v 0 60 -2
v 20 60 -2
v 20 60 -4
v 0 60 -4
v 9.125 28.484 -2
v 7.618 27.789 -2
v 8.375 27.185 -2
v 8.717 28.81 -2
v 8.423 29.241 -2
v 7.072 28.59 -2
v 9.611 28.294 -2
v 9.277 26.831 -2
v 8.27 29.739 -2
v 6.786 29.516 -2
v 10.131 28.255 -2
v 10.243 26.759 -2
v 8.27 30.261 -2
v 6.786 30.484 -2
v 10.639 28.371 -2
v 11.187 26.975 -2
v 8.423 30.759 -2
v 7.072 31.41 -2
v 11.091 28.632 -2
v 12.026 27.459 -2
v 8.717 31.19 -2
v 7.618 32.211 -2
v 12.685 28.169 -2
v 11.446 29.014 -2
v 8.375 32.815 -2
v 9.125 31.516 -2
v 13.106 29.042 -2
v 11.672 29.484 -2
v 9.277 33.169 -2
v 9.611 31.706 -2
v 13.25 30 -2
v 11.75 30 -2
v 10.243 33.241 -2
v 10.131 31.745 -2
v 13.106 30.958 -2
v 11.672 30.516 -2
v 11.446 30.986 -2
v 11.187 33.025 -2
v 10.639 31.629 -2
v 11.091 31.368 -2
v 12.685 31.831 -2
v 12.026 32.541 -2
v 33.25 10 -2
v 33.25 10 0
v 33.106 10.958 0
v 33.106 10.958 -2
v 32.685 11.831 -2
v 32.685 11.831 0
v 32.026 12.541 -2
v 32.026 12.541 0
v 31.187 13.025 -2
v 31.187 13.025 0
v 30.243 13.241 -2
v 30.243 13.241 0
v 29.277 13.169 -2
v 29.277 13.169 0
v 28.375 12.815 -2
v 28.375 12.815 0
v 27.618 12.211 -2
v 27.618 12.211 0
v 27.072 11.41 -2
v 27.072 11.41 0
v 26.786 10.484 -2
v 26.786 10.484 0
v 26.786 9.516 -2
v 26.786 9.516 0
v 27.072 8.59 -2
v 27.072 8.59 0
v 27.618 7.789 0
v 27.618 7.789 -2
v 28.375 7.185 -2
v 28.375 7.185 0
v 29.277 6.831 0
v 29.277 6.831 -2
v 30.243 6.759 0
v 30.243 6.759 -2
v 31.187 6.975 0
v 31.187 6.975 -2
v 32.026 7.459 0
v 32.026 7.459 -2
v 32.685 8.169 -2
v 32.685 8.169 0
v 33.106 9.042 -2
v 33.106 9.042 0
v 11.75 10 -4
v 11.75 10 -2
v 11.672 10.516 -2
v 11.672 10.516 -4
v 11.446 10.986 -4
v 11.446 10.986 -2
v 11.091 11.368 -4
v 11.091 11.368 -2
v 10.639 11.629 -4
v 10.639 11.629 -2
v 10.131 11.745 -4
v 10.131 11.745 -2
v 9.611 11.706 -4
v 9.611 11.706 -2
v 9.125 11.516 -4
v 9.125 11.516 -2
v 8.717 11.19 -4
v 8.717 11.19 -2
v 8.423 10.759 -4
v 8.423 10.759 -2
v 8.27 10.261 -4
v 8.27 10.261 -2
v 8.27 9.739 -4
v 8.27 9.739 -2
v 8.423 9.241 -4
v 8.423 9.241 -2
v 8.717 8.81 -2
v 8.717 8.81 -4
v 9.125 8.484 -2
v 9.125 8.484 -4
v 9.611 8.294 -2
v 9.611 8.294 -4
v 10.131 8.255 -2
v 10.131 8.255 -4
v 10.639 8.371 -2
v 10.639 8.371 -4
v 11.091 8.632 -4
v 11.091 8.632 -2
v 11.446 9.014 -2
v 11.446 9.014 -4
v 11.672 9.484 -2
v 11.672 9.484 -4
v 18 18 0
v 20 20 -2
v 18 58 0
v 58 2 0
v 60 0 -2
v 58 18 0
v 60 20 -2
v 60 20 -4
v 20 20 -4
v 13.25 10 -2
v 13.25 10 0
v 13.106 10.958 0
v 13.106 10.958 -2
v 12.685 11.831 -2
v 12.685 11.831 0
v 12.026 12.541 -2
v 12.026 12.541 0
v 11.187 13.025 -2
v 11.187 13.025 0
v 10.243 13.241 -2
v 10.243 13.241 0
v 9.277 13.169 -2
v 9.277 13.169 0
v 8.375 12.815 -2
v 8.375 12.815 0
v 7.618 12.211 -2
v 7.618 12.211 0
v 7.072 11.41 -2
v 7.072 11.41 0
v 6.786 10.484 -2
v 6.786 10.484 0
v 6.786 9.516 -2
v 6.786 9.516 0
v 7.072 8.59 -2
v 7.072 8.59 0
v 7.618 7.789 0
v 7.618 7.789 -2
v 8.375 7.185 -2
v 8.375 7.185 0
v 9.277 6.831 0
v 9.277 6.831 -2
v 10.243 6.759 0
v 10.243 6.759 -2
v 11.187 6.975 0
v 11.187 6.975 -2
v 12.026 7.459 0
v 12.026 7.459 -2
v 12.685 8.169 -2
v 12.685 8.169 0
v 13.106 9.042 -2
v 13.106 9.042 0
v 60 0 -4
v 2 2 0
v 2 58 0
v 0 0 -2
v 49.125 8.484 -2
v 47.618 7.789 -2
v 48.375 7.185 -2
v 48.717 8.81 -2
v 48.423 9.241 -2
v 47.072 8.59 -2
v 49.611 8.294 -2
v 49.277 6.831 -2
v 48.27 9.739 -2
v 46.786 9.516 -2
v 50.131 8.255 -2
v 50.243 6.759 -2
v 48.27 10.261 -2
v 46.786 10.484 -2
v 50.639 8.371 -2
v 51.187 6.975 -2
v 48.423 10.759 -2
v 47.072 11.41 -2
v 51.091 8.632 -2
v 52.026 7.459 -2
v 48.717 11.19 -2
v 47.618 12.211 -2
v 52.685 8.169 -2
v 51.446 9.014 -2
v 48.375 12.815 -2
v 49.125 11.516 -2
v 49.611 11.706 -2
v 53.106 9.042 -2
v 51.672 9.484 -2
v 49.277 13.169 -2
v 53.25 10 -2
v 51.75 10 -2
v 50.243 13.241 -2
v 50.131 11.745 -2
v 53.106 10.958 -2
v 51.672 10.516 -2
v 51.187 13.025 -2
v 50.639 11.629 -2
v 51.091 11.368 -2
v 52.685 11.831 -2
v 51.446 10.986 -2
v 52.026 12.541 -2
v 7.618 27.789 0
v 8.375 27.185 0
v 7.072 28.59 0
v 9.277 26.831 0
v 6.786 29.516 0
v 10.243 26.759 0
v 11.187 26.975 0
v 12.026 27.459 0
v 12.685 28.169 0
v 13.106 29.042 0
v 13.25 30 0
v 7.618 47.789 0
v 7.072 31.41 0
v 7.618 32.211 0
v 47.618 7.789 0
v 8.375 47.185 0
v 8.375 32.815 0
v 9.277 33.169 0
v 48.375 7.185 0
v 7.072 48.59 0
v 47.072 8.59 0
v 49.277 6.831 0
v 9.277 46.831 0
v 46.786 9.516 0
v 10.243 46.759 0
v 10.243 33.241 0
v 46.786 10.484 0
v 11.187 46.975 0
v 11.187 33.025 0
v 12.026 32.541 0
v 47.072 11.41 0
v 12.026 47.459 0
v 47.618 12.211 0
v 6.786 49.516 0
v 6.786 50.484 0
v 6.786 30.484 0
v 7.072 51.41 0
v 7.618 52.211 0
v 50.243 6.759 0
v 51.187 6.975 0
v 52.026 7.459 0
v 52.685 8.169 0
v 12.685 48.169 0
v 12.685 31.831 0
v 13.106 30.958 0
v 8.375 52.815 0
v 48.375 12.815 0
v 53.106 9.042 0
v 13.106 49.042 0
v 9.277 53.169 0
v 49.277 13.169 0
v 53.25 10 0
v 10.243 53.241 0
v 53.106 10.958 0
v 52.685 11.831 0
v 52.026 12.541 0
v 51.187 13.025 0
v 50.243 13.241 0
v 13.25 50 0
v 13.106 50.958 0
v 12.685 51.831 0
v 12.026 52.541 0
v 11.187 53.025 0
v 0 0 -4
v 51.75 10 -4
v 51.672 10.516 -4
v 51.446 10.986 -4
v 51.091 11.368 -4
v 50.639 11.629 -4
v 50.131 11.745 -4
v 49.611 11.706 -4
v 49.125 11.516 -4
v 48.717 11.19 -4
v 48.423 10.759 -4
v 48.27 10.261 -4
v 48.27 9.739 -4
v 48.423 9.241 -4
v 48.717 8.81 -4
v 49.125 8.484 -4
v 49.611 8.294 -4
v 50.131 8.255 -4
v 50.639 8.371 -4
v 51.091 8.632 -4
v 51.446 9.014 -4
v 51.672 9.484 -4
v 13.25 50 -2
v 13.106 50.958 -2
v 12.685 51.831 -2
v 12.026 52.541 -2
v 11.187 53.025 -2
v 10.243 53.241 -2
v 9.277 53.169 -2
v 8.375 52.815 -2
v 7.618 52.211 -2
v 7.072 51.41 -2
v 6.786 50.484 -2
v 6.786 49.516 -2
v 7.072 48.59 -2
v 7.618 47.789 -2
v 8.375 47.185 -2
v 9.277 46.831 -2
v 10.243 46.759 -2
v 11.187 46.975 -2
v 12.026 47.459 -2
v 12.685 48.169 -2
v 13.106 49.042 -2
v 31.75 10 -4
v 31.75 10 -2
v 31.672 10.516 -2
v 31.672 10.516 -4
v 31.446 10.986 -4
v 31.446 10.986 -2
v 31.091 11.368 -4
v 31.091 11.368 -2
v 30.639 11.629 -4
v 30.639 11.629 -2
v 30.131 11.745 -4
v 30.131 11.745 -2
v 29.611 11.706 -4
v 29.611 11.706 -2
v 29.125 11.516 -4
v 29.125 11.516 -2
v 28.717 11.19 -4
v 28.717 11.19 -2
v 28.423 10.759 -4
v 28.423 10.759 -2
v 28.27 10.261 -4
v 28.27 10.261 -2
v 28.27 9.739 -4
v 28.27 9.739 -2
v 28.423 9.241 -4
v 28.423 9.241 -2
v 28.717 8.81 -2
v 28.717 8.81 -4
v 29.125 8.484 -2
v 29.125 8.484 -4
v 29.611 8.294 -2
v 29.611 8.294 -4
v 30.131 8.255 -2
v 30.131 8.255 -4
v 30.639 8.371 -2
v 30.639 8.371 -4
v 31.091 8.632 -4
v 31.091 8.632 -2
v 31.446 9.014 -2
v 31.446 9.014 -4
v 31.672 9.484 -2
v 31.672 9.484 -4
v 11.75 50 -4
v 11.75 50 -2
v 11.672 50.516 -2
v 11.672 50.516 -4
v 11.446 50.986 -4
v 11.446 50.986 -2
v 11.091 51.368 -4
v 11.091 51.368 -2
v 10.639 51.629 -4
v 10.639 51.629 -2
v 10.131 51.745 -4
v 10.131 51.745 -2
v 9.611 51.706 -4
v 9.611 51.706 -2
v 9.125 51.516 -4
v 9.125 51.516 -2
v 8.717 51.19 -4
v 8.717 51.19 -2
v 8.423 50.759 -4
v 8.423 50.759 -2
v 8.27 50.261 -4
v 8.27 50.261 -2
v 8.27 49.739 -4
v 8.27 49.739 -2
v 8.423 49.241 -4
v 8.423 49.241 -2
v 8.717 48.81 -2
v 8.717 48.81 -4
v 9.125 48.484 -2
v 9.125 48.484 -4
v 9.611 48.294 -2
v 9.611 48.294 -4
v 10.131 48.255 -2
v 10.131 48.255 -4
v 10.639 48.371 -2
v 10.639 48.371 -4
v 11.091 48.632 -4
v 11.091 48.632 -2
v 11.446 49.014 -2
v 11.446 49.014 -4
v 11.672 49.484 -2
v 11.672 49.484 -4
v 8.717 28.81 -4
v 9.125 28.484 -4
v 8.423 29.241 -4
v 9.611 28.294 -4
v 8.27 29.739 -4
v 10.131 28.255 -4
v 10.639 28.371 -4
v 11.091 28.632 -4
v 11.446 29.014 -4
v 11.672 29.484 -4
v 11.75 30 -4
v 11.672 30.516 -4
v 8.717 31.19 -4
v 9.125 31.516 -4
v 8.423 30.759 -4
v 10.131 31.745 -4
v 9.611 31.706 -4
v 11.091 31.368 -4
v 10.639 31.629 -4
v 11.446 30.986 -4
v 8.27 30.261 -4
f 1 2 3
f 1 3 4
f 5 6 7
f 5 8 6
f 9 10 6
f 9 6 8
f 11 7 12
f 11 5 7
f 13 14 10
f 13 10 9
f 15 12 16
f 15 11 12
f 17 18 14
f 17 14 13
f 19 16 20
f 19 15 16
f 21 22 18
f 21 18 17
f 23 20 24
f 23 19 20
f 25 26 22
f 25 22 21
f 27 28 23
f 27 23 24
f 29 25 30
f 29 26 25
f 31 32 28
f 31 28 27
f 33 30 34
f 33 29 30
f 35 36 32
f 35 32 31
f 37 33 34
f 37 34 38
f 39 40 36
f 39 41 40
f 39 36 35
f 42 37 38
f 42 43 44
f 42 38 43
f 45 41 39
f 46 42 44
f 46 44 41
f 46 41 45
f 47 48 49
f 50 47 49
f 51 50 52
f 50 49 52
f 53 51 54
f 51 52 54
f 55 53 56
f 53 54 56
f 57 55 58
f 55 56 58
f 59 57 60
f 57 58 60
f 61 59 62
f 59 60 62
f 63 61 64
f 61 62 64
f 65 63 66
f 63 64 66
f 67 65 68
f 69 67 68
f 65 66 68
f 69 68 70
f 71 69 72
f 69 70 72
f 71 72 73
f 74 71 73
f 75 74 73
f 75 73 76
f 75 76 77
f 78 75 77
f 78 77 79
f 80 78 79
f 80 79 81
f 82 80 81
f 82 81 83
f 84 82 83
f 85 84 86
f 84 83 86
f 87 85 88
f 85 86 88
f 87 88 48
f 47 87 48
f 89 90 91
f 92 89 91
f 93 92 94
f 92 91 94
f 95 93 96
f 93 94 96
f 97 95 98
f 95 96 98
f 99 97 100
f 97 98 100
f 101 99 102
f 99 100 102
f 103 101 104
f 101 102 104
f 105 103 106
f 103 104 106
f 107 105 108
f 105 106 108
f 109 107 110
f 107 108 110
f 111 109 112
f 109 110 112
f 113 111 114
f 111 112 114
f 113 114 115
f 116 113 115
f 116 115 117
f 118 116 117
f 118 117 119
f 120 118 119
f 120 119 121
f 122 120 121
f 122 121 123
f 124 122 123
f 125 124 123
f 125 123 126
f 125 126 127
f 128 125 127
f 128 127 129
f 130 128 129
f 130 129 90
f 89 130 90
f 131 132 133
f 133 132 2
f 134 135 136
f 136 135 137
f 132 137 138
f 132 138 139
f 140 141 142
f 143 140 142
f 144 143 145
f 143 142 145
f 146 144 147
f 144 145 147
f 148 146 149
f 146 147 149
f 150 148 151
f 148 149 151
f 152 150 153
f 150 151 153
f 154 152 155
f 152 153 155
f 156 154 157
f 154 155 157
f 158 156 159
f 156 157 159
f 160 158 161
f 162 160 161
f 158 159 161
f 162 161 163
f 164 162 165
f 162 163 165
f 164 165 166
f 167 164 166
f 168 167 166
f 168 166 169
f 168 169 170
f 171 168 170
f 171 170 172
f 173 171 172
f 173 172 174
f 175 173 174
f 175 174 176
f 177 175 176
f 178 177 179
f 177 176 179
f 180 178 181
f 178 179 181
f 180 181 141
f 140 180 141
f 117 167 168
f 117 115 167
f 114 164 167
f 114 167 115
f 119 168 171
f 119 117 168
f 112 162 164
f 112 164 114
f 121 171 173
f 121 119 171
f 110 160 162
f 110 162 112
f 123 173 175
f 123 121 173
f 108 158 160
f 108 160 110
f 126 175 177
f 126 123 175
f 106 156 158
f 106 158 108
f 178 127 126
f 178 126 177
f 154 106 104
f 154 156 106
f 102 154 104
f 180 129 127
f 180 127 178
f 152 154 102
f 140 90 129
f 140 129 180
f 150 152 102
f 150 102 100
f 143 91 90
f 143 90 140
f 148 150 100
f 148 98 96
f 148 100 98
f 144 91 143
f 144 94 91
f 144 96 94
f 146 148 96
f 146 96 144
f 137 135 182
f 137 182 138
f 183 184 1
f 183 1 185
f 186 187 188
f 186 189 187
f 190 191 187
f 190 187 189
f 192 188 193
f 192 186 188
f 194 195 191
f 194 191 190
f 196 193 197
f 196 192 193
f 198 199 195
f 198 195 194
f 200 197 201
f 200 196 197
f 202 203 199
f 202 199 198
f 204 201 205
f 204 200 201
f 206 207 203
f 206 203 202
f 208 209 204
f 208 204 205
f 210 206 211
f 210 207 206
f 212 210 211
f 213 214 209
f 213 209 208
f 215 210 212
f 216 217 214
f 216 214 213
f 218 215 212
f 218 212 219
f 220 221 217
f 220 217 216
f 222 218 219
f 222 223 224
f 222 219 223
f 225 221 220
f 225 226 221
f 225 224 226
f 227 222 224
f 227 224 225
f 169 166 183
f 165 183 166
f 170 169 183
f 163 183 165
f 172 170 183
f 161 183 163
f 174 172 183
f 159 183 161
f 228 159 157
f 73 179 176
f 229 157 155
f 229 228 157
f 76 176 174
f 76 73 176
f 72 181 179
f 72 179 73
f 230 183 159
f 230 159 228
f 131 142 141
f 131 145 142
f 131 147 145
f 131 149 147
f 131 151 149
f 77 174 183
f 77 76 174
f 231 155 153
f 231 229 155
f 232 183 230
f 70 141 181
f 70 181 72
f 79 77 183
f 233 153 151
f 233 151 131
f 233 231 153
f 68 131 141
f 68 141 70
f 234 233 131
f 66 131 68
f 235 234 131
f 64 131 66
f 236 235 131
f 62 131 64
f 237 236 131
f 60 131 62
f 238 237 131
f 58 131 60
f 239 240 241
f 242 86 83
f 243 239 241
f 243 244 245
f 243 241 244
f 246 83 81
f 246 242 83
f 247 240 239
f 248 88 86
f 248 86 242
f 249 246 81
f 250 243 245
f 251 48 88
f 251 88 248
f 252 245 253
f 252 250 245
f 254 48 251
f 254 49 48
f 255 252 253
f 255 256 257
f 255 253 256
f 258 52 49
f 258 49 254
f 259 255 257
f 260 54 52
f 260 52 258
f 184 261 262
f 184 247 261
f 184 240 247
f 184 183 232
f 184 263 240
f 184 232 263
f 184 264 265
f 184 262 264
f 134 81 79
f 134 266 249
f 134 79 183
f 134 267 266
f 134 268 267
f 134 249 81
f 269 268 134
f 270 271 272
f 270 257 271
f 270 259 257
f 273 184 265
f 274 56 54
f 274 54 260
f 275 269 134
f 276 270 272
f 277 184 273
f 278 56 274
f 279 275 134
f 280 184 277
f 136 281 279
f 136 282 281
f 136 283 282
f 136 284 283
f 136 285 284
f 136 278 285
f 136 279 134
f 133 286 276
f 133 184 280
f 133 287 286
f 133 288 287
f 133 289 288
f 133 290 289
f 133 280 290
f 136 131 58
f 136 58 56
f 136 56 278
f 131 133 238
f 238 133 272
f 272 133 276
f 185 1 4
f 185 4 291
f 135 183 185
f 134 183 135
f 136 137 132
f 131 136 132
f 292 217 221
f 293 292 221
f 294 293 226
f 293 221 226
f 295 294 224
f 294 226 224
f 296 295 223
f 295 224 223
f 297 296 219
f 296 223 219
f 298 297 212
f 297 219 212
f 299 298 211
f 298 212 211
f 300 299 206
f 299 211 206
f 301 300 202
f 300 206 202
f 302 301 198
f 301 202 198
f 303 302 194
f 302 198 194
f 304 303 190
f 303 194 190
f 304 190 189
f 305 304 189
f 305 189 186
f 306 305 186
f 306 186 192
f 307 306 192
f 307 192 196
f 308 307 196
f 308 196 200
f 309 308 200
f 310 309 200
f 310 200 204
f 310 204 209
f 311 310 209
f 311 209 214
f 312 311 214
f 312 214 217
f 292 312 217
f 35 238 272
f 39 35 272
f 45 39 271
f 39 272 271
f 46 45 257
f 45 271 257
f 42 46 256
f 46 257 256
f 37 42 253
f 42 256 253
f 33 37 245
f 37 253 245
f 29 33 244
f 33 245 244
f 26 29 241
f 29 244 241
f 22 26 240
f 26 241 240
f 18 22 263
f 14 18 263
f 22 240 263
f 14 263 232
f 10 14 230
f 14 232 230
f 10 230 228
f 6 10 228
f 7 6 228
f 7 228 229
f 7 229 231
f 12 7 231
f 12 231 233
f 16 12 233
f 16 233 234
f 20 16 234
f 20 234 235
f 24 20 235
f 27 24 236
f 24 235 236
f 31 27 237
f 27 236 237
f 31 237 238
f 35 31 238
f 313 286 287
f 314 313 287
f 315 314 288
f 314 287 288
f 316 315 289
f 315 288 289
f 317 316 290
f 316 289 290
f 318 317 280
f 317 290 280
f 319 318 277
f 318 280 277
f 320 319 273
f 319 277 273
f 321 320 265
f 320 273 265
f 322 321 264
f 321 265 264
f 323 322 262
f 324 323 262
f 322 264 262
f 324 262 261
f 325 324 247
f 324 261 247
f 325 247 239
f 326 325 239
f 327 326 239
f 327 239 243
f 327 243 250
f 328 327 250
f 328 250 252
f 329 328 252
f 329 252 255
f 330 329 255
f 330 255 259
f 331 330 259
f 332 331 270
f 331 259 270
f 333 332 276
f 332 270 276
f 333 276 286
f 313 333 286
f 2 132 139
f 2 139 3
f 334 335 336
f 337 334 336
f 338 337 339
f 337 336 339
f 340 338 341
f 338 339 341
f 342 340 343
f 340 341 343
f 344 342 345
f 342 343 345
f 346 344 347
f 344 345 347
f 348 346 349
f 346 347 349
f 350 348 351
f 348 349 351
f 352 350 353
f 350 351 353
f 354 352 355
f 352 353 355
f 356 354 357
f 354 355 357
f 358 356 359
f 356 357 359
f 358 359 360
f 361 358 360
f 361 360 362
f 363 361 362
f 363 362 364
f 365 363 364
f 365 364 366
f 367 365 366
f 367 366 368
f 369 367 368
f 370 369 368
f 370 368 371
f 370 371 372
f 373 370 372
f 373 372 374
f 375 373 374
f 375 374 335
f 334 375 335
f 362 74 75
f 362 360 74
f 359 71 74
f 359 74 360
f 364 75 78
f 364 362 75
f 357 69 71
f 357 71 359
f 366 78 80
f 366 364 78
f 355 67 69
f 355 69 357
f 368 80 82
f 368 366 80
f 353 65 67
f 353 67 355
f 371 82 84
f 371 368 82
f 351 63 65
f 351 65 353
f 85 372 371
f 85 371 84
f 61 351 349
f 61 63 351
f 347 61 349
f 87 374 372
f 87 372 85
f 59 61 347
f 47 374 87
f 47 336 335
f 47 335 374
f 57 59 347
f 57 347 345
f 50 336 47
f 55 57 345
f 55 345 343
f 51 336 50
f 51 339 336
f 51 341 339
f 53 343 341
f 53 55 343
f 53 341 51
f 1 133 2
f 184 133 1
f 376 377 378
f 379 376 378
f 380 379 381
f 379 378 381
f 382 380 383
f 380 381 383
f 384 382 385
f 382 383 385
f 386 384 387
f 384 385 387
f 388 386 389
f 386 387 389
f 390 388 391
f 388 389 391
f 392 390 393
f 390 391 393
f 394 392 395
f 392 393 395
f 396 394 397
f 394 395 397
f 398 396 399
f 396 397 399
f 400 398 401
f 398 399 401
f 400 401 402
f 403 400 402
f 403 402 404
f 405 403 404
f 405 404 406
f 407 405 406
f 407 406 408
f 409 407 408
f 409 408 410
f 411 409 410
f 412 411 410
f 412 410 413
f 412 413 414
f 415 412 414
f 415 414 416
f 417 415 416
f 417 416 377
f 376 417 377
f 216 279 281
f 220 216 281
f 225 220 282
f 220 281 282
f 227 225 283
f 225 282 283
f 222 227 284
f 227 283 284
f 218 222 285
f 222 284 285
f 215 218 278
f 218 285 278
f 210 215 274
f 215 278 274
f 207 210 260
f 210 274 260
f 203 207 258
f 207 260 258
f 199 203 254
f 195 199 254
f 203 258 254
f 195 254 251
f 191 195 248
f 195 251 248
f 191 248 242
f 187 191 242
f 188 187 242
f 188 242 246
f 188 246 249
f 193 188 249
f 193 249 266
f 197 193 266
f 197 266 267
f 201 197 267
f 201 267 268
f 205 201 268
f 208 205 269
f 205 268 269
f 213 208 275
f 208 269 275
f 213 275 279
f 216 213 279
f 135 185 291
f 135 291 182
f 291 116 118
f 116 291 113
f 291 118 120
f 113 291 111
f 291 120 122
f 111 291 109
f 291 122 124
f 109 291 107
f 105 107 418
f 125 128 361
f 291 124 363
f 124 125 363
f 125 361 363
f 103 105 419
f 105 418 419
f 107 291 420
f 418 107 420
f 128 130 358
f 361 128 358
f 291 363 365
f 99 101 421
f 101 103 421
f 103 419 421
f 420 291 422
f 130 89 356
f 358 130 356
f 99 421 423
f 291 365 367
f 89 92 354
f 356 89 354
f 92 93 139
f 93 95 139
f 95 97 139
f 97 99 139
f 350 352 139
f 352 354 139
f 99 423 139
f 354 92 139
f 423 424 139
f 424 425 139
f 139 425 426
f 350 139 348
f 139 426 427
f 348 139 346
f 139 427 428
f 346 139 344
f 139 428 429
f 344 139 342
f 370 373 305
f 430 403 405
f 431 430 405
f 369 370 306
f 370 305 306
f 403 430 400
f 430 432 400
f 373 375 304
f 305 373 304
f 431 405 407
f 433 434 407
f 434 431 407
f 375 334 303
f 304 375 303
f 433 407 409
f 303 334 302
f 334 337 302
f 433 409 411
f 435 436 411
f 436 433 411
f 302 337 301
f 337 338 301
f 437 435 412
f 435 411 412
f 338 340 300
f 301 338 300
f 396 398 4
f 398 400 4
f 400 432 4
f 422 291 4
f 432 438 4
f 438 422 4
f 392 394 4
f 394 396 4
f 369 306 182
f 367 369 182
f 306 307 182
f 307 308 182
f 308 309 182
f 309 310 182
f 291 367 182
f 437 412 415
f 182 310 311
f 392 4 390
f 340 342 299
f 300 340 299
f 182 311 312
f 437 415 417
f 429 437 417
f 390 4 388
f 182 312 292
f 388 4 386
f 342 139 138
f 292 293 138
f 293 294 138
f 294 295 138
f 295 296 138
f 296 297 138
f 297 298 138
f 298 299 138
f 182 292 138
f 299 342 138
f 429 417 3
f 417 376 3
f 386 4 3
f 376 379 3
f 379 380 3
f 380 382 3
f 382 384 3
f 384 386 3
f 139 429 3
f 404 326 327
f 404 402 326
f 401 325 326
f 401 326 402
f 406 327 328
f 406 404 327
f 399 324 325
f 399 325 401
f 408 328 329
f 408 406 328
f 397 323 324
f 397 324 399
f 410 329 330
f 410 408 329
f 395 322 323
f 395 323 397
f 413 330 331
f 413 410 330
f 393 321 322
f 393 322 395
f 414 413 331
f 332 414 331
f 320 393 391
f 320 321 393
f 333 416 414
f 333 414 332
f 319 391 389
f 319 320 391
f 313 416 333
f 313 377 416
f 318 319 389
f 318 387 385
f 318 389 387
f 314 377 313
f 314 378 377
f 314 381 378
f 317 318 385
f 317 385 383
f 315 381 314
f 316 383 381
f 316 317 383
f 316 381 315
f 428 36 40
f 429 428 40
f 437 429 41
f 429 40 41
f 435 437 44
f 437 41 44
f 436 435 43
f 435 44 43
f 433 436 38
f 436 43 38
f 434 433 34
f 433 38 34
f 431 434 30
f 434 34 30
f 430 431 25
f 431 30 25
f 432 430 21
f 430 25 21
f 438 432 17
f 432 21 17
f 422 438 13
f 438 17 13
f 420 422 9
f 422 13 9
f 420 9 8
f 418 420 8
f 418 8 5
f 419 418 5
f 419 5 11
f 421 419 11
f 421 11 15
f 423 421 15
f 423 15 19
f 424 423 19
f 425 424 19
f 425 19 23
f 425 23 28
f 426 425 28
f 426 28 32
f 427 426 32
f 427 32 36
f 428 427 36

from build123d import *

# Parameters (mm, degrees)
F2_R     = 3.25
F2_R_2   = 1.75
F3_DEPTH = 4
F4_DEPTH = 4.001
F5_DEPTH = 2
F6_SIZE  = 2


with BuildPart() as f3:
    # F2 (on Top) → F3 (new body)
    with BuildSketch(Plane.XY):
        Polygon((0, 60), (0, 0), (60, 0), (60, 20), (20, 20), (20, 60), align=None)
        with Locations((10, 10)):
            Circle(F2_R, mode=Mode.SUBTRACT)
        with Locations((30, 10)):
            Circle(F2_R, mode=Mode.SUBTRACT)
        with Locations((50, 10)):
            Circle(F2_R, mode=Mode.SUBTRACT)
        with Locations((10, 30)):
            Circle(F2_R, mode=Mode.SUBTRACT)
        with Locations((10, 50)):
            Circle(F2_R, mode=Mode.SUBTRACT)
        with Locations((10, 50)):
            Circle(F2_R)
        with Locations((10, 50)):
            Circle(F2_R_2, mode=Mode.SUBTRACT)
        with Locations((10, 30)):
            Circle(F2_R)
        with Locations((10, 30)):
            Circle(F2_R_2, mode=Mode.SUBTRACT)
        with Locations((10, 10)):
            Circle(F2_R)
        with Locations((10, 10)):
            Circle(F2_R_2, mode=Mode.SUBTRACT)
        with Locations((30, 10)):
            Circle(F2_R)
        with Locations((30, 10)):
            Circle(F2_R_2, mode=Mode.SUBTRACT)
        with Locations((50, 10)):
            Circle(F2_R)
        with Locations((50, 10)):
            Circle(F2_R_2, mode=Mode.SUBTRACT)
        with Locations((10, 50)):
            Circle(F2_R_2)
        with Locations((10, 30)):
            Circle(F2_R_2)
        with Locations((10, 10)):
            Circle(F2_R_2)
        with Locations((30, 10)):
            Circle(F2_R_2)
        with Locations((50, 10)):
            Circle(F2_R_2)
    extrude(amount=-F3_DEPTH)

    # F2 (on Top) → F4 (cut, through all)
    with BuildSketch(Plane.XY):
        with Locations((10, 50)):
            Circle(F2_R_2)
        with Locations((10, 30)):
            Circle(F2_R_2)
        with Locations((10, 10)):
            Circle(F2_R_2)
        with Locations((30, 10)):
            Circle(F2_R_2)
        with Locations((50, 10)):
            Circle(F2_R_2)
    extrude(amount=-F4_DEPTH, mode=Mode.SUBTRACT)

    # F2 (on Top) → F5 (cut)
    with BuildSketch(Plane.XY):
        with Locations((10, 50)):
            Circle(F2_R)
        with Locations((10, 50)):
            Circle(F2_R_2, mode=Mode.SUBTRACT)
        with Locations((10, 30)):
            Circle(F2_R)
        with Locations((10, 30)):
            Circle(F2_R_2, mode=Mode.SUBTRACT)
        with Locations((10, 10)):
            Circle(F2_R)
        with Locations((10, 10)):
            Circle(F2_R_2, mode=Mode.SUBTRACT)
        with Locations((30, 10)):
            Circle(F2_R)
        with Locations((30, 10)):
            Circle(F2_R_2, mode=Mode.SUBTRACT)
        with Locations((50, 10)):
            Circle(F2_R)
        with Locations((50, 10)):
            Circle(F2_R_2, mode=Mode.SUBTRACT)
    extrude(amount=-F5_DEPTH, mode=Mode.SUBTRACT)

    # F6
    f6_edges = [f3.edges().sort_by_distance(p)[0] for p in [
        (40, 20, 0),
        (20, 40, 0),
        (10, 60, 0),
        (0, 30, 0),
        (30, 0, 0),
        (60, 10, 0),
    ]]
    chamfer(f6_edges, length=F6_SIZE)


solid = f3.part
